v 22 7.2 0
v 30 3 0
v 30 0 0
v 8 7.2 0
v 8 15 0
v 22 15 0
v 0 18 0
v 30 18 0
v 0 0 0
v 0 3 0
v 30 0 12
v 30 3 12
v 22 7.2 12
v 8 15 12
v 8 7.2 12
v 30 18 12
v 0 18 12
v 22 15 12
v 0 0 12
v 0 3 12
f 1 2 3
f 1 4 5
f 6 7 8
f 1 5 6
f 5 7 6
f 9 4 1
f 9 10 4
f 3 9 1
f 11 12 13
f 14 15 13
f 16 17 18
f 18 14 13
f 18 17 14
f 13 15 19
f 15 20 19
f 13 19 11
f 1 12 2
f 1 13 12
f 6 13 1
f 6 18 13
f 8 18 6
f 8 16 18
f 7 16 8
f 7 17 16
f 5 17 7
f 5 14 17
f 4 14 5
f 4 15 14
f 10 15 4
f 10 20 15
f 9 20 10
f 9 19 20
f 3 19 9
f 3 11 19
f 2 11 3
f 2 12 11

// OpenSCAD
$fn = 32;

// ----------------------------------------------------------------------
// Key bar: dovetail key, 12 mm thick
// ----------------------------------------------------------------------

// --- parameters (mm) ---
profile_height = 12;      // extrusion height
profile_points = 10;      // points of the closed outline

profile = [[0, 0], [30, 0], [30, 3], [22, 7.2], [22, 15], [30, 18], [0, 18], [8, 15], [8, 7.2], [0, 3]];  // single closed polygon, 10 points, counter clockwise

// --- the one profile operation ---
linear_extrude(height = profile_height) polygon(points = profile);
